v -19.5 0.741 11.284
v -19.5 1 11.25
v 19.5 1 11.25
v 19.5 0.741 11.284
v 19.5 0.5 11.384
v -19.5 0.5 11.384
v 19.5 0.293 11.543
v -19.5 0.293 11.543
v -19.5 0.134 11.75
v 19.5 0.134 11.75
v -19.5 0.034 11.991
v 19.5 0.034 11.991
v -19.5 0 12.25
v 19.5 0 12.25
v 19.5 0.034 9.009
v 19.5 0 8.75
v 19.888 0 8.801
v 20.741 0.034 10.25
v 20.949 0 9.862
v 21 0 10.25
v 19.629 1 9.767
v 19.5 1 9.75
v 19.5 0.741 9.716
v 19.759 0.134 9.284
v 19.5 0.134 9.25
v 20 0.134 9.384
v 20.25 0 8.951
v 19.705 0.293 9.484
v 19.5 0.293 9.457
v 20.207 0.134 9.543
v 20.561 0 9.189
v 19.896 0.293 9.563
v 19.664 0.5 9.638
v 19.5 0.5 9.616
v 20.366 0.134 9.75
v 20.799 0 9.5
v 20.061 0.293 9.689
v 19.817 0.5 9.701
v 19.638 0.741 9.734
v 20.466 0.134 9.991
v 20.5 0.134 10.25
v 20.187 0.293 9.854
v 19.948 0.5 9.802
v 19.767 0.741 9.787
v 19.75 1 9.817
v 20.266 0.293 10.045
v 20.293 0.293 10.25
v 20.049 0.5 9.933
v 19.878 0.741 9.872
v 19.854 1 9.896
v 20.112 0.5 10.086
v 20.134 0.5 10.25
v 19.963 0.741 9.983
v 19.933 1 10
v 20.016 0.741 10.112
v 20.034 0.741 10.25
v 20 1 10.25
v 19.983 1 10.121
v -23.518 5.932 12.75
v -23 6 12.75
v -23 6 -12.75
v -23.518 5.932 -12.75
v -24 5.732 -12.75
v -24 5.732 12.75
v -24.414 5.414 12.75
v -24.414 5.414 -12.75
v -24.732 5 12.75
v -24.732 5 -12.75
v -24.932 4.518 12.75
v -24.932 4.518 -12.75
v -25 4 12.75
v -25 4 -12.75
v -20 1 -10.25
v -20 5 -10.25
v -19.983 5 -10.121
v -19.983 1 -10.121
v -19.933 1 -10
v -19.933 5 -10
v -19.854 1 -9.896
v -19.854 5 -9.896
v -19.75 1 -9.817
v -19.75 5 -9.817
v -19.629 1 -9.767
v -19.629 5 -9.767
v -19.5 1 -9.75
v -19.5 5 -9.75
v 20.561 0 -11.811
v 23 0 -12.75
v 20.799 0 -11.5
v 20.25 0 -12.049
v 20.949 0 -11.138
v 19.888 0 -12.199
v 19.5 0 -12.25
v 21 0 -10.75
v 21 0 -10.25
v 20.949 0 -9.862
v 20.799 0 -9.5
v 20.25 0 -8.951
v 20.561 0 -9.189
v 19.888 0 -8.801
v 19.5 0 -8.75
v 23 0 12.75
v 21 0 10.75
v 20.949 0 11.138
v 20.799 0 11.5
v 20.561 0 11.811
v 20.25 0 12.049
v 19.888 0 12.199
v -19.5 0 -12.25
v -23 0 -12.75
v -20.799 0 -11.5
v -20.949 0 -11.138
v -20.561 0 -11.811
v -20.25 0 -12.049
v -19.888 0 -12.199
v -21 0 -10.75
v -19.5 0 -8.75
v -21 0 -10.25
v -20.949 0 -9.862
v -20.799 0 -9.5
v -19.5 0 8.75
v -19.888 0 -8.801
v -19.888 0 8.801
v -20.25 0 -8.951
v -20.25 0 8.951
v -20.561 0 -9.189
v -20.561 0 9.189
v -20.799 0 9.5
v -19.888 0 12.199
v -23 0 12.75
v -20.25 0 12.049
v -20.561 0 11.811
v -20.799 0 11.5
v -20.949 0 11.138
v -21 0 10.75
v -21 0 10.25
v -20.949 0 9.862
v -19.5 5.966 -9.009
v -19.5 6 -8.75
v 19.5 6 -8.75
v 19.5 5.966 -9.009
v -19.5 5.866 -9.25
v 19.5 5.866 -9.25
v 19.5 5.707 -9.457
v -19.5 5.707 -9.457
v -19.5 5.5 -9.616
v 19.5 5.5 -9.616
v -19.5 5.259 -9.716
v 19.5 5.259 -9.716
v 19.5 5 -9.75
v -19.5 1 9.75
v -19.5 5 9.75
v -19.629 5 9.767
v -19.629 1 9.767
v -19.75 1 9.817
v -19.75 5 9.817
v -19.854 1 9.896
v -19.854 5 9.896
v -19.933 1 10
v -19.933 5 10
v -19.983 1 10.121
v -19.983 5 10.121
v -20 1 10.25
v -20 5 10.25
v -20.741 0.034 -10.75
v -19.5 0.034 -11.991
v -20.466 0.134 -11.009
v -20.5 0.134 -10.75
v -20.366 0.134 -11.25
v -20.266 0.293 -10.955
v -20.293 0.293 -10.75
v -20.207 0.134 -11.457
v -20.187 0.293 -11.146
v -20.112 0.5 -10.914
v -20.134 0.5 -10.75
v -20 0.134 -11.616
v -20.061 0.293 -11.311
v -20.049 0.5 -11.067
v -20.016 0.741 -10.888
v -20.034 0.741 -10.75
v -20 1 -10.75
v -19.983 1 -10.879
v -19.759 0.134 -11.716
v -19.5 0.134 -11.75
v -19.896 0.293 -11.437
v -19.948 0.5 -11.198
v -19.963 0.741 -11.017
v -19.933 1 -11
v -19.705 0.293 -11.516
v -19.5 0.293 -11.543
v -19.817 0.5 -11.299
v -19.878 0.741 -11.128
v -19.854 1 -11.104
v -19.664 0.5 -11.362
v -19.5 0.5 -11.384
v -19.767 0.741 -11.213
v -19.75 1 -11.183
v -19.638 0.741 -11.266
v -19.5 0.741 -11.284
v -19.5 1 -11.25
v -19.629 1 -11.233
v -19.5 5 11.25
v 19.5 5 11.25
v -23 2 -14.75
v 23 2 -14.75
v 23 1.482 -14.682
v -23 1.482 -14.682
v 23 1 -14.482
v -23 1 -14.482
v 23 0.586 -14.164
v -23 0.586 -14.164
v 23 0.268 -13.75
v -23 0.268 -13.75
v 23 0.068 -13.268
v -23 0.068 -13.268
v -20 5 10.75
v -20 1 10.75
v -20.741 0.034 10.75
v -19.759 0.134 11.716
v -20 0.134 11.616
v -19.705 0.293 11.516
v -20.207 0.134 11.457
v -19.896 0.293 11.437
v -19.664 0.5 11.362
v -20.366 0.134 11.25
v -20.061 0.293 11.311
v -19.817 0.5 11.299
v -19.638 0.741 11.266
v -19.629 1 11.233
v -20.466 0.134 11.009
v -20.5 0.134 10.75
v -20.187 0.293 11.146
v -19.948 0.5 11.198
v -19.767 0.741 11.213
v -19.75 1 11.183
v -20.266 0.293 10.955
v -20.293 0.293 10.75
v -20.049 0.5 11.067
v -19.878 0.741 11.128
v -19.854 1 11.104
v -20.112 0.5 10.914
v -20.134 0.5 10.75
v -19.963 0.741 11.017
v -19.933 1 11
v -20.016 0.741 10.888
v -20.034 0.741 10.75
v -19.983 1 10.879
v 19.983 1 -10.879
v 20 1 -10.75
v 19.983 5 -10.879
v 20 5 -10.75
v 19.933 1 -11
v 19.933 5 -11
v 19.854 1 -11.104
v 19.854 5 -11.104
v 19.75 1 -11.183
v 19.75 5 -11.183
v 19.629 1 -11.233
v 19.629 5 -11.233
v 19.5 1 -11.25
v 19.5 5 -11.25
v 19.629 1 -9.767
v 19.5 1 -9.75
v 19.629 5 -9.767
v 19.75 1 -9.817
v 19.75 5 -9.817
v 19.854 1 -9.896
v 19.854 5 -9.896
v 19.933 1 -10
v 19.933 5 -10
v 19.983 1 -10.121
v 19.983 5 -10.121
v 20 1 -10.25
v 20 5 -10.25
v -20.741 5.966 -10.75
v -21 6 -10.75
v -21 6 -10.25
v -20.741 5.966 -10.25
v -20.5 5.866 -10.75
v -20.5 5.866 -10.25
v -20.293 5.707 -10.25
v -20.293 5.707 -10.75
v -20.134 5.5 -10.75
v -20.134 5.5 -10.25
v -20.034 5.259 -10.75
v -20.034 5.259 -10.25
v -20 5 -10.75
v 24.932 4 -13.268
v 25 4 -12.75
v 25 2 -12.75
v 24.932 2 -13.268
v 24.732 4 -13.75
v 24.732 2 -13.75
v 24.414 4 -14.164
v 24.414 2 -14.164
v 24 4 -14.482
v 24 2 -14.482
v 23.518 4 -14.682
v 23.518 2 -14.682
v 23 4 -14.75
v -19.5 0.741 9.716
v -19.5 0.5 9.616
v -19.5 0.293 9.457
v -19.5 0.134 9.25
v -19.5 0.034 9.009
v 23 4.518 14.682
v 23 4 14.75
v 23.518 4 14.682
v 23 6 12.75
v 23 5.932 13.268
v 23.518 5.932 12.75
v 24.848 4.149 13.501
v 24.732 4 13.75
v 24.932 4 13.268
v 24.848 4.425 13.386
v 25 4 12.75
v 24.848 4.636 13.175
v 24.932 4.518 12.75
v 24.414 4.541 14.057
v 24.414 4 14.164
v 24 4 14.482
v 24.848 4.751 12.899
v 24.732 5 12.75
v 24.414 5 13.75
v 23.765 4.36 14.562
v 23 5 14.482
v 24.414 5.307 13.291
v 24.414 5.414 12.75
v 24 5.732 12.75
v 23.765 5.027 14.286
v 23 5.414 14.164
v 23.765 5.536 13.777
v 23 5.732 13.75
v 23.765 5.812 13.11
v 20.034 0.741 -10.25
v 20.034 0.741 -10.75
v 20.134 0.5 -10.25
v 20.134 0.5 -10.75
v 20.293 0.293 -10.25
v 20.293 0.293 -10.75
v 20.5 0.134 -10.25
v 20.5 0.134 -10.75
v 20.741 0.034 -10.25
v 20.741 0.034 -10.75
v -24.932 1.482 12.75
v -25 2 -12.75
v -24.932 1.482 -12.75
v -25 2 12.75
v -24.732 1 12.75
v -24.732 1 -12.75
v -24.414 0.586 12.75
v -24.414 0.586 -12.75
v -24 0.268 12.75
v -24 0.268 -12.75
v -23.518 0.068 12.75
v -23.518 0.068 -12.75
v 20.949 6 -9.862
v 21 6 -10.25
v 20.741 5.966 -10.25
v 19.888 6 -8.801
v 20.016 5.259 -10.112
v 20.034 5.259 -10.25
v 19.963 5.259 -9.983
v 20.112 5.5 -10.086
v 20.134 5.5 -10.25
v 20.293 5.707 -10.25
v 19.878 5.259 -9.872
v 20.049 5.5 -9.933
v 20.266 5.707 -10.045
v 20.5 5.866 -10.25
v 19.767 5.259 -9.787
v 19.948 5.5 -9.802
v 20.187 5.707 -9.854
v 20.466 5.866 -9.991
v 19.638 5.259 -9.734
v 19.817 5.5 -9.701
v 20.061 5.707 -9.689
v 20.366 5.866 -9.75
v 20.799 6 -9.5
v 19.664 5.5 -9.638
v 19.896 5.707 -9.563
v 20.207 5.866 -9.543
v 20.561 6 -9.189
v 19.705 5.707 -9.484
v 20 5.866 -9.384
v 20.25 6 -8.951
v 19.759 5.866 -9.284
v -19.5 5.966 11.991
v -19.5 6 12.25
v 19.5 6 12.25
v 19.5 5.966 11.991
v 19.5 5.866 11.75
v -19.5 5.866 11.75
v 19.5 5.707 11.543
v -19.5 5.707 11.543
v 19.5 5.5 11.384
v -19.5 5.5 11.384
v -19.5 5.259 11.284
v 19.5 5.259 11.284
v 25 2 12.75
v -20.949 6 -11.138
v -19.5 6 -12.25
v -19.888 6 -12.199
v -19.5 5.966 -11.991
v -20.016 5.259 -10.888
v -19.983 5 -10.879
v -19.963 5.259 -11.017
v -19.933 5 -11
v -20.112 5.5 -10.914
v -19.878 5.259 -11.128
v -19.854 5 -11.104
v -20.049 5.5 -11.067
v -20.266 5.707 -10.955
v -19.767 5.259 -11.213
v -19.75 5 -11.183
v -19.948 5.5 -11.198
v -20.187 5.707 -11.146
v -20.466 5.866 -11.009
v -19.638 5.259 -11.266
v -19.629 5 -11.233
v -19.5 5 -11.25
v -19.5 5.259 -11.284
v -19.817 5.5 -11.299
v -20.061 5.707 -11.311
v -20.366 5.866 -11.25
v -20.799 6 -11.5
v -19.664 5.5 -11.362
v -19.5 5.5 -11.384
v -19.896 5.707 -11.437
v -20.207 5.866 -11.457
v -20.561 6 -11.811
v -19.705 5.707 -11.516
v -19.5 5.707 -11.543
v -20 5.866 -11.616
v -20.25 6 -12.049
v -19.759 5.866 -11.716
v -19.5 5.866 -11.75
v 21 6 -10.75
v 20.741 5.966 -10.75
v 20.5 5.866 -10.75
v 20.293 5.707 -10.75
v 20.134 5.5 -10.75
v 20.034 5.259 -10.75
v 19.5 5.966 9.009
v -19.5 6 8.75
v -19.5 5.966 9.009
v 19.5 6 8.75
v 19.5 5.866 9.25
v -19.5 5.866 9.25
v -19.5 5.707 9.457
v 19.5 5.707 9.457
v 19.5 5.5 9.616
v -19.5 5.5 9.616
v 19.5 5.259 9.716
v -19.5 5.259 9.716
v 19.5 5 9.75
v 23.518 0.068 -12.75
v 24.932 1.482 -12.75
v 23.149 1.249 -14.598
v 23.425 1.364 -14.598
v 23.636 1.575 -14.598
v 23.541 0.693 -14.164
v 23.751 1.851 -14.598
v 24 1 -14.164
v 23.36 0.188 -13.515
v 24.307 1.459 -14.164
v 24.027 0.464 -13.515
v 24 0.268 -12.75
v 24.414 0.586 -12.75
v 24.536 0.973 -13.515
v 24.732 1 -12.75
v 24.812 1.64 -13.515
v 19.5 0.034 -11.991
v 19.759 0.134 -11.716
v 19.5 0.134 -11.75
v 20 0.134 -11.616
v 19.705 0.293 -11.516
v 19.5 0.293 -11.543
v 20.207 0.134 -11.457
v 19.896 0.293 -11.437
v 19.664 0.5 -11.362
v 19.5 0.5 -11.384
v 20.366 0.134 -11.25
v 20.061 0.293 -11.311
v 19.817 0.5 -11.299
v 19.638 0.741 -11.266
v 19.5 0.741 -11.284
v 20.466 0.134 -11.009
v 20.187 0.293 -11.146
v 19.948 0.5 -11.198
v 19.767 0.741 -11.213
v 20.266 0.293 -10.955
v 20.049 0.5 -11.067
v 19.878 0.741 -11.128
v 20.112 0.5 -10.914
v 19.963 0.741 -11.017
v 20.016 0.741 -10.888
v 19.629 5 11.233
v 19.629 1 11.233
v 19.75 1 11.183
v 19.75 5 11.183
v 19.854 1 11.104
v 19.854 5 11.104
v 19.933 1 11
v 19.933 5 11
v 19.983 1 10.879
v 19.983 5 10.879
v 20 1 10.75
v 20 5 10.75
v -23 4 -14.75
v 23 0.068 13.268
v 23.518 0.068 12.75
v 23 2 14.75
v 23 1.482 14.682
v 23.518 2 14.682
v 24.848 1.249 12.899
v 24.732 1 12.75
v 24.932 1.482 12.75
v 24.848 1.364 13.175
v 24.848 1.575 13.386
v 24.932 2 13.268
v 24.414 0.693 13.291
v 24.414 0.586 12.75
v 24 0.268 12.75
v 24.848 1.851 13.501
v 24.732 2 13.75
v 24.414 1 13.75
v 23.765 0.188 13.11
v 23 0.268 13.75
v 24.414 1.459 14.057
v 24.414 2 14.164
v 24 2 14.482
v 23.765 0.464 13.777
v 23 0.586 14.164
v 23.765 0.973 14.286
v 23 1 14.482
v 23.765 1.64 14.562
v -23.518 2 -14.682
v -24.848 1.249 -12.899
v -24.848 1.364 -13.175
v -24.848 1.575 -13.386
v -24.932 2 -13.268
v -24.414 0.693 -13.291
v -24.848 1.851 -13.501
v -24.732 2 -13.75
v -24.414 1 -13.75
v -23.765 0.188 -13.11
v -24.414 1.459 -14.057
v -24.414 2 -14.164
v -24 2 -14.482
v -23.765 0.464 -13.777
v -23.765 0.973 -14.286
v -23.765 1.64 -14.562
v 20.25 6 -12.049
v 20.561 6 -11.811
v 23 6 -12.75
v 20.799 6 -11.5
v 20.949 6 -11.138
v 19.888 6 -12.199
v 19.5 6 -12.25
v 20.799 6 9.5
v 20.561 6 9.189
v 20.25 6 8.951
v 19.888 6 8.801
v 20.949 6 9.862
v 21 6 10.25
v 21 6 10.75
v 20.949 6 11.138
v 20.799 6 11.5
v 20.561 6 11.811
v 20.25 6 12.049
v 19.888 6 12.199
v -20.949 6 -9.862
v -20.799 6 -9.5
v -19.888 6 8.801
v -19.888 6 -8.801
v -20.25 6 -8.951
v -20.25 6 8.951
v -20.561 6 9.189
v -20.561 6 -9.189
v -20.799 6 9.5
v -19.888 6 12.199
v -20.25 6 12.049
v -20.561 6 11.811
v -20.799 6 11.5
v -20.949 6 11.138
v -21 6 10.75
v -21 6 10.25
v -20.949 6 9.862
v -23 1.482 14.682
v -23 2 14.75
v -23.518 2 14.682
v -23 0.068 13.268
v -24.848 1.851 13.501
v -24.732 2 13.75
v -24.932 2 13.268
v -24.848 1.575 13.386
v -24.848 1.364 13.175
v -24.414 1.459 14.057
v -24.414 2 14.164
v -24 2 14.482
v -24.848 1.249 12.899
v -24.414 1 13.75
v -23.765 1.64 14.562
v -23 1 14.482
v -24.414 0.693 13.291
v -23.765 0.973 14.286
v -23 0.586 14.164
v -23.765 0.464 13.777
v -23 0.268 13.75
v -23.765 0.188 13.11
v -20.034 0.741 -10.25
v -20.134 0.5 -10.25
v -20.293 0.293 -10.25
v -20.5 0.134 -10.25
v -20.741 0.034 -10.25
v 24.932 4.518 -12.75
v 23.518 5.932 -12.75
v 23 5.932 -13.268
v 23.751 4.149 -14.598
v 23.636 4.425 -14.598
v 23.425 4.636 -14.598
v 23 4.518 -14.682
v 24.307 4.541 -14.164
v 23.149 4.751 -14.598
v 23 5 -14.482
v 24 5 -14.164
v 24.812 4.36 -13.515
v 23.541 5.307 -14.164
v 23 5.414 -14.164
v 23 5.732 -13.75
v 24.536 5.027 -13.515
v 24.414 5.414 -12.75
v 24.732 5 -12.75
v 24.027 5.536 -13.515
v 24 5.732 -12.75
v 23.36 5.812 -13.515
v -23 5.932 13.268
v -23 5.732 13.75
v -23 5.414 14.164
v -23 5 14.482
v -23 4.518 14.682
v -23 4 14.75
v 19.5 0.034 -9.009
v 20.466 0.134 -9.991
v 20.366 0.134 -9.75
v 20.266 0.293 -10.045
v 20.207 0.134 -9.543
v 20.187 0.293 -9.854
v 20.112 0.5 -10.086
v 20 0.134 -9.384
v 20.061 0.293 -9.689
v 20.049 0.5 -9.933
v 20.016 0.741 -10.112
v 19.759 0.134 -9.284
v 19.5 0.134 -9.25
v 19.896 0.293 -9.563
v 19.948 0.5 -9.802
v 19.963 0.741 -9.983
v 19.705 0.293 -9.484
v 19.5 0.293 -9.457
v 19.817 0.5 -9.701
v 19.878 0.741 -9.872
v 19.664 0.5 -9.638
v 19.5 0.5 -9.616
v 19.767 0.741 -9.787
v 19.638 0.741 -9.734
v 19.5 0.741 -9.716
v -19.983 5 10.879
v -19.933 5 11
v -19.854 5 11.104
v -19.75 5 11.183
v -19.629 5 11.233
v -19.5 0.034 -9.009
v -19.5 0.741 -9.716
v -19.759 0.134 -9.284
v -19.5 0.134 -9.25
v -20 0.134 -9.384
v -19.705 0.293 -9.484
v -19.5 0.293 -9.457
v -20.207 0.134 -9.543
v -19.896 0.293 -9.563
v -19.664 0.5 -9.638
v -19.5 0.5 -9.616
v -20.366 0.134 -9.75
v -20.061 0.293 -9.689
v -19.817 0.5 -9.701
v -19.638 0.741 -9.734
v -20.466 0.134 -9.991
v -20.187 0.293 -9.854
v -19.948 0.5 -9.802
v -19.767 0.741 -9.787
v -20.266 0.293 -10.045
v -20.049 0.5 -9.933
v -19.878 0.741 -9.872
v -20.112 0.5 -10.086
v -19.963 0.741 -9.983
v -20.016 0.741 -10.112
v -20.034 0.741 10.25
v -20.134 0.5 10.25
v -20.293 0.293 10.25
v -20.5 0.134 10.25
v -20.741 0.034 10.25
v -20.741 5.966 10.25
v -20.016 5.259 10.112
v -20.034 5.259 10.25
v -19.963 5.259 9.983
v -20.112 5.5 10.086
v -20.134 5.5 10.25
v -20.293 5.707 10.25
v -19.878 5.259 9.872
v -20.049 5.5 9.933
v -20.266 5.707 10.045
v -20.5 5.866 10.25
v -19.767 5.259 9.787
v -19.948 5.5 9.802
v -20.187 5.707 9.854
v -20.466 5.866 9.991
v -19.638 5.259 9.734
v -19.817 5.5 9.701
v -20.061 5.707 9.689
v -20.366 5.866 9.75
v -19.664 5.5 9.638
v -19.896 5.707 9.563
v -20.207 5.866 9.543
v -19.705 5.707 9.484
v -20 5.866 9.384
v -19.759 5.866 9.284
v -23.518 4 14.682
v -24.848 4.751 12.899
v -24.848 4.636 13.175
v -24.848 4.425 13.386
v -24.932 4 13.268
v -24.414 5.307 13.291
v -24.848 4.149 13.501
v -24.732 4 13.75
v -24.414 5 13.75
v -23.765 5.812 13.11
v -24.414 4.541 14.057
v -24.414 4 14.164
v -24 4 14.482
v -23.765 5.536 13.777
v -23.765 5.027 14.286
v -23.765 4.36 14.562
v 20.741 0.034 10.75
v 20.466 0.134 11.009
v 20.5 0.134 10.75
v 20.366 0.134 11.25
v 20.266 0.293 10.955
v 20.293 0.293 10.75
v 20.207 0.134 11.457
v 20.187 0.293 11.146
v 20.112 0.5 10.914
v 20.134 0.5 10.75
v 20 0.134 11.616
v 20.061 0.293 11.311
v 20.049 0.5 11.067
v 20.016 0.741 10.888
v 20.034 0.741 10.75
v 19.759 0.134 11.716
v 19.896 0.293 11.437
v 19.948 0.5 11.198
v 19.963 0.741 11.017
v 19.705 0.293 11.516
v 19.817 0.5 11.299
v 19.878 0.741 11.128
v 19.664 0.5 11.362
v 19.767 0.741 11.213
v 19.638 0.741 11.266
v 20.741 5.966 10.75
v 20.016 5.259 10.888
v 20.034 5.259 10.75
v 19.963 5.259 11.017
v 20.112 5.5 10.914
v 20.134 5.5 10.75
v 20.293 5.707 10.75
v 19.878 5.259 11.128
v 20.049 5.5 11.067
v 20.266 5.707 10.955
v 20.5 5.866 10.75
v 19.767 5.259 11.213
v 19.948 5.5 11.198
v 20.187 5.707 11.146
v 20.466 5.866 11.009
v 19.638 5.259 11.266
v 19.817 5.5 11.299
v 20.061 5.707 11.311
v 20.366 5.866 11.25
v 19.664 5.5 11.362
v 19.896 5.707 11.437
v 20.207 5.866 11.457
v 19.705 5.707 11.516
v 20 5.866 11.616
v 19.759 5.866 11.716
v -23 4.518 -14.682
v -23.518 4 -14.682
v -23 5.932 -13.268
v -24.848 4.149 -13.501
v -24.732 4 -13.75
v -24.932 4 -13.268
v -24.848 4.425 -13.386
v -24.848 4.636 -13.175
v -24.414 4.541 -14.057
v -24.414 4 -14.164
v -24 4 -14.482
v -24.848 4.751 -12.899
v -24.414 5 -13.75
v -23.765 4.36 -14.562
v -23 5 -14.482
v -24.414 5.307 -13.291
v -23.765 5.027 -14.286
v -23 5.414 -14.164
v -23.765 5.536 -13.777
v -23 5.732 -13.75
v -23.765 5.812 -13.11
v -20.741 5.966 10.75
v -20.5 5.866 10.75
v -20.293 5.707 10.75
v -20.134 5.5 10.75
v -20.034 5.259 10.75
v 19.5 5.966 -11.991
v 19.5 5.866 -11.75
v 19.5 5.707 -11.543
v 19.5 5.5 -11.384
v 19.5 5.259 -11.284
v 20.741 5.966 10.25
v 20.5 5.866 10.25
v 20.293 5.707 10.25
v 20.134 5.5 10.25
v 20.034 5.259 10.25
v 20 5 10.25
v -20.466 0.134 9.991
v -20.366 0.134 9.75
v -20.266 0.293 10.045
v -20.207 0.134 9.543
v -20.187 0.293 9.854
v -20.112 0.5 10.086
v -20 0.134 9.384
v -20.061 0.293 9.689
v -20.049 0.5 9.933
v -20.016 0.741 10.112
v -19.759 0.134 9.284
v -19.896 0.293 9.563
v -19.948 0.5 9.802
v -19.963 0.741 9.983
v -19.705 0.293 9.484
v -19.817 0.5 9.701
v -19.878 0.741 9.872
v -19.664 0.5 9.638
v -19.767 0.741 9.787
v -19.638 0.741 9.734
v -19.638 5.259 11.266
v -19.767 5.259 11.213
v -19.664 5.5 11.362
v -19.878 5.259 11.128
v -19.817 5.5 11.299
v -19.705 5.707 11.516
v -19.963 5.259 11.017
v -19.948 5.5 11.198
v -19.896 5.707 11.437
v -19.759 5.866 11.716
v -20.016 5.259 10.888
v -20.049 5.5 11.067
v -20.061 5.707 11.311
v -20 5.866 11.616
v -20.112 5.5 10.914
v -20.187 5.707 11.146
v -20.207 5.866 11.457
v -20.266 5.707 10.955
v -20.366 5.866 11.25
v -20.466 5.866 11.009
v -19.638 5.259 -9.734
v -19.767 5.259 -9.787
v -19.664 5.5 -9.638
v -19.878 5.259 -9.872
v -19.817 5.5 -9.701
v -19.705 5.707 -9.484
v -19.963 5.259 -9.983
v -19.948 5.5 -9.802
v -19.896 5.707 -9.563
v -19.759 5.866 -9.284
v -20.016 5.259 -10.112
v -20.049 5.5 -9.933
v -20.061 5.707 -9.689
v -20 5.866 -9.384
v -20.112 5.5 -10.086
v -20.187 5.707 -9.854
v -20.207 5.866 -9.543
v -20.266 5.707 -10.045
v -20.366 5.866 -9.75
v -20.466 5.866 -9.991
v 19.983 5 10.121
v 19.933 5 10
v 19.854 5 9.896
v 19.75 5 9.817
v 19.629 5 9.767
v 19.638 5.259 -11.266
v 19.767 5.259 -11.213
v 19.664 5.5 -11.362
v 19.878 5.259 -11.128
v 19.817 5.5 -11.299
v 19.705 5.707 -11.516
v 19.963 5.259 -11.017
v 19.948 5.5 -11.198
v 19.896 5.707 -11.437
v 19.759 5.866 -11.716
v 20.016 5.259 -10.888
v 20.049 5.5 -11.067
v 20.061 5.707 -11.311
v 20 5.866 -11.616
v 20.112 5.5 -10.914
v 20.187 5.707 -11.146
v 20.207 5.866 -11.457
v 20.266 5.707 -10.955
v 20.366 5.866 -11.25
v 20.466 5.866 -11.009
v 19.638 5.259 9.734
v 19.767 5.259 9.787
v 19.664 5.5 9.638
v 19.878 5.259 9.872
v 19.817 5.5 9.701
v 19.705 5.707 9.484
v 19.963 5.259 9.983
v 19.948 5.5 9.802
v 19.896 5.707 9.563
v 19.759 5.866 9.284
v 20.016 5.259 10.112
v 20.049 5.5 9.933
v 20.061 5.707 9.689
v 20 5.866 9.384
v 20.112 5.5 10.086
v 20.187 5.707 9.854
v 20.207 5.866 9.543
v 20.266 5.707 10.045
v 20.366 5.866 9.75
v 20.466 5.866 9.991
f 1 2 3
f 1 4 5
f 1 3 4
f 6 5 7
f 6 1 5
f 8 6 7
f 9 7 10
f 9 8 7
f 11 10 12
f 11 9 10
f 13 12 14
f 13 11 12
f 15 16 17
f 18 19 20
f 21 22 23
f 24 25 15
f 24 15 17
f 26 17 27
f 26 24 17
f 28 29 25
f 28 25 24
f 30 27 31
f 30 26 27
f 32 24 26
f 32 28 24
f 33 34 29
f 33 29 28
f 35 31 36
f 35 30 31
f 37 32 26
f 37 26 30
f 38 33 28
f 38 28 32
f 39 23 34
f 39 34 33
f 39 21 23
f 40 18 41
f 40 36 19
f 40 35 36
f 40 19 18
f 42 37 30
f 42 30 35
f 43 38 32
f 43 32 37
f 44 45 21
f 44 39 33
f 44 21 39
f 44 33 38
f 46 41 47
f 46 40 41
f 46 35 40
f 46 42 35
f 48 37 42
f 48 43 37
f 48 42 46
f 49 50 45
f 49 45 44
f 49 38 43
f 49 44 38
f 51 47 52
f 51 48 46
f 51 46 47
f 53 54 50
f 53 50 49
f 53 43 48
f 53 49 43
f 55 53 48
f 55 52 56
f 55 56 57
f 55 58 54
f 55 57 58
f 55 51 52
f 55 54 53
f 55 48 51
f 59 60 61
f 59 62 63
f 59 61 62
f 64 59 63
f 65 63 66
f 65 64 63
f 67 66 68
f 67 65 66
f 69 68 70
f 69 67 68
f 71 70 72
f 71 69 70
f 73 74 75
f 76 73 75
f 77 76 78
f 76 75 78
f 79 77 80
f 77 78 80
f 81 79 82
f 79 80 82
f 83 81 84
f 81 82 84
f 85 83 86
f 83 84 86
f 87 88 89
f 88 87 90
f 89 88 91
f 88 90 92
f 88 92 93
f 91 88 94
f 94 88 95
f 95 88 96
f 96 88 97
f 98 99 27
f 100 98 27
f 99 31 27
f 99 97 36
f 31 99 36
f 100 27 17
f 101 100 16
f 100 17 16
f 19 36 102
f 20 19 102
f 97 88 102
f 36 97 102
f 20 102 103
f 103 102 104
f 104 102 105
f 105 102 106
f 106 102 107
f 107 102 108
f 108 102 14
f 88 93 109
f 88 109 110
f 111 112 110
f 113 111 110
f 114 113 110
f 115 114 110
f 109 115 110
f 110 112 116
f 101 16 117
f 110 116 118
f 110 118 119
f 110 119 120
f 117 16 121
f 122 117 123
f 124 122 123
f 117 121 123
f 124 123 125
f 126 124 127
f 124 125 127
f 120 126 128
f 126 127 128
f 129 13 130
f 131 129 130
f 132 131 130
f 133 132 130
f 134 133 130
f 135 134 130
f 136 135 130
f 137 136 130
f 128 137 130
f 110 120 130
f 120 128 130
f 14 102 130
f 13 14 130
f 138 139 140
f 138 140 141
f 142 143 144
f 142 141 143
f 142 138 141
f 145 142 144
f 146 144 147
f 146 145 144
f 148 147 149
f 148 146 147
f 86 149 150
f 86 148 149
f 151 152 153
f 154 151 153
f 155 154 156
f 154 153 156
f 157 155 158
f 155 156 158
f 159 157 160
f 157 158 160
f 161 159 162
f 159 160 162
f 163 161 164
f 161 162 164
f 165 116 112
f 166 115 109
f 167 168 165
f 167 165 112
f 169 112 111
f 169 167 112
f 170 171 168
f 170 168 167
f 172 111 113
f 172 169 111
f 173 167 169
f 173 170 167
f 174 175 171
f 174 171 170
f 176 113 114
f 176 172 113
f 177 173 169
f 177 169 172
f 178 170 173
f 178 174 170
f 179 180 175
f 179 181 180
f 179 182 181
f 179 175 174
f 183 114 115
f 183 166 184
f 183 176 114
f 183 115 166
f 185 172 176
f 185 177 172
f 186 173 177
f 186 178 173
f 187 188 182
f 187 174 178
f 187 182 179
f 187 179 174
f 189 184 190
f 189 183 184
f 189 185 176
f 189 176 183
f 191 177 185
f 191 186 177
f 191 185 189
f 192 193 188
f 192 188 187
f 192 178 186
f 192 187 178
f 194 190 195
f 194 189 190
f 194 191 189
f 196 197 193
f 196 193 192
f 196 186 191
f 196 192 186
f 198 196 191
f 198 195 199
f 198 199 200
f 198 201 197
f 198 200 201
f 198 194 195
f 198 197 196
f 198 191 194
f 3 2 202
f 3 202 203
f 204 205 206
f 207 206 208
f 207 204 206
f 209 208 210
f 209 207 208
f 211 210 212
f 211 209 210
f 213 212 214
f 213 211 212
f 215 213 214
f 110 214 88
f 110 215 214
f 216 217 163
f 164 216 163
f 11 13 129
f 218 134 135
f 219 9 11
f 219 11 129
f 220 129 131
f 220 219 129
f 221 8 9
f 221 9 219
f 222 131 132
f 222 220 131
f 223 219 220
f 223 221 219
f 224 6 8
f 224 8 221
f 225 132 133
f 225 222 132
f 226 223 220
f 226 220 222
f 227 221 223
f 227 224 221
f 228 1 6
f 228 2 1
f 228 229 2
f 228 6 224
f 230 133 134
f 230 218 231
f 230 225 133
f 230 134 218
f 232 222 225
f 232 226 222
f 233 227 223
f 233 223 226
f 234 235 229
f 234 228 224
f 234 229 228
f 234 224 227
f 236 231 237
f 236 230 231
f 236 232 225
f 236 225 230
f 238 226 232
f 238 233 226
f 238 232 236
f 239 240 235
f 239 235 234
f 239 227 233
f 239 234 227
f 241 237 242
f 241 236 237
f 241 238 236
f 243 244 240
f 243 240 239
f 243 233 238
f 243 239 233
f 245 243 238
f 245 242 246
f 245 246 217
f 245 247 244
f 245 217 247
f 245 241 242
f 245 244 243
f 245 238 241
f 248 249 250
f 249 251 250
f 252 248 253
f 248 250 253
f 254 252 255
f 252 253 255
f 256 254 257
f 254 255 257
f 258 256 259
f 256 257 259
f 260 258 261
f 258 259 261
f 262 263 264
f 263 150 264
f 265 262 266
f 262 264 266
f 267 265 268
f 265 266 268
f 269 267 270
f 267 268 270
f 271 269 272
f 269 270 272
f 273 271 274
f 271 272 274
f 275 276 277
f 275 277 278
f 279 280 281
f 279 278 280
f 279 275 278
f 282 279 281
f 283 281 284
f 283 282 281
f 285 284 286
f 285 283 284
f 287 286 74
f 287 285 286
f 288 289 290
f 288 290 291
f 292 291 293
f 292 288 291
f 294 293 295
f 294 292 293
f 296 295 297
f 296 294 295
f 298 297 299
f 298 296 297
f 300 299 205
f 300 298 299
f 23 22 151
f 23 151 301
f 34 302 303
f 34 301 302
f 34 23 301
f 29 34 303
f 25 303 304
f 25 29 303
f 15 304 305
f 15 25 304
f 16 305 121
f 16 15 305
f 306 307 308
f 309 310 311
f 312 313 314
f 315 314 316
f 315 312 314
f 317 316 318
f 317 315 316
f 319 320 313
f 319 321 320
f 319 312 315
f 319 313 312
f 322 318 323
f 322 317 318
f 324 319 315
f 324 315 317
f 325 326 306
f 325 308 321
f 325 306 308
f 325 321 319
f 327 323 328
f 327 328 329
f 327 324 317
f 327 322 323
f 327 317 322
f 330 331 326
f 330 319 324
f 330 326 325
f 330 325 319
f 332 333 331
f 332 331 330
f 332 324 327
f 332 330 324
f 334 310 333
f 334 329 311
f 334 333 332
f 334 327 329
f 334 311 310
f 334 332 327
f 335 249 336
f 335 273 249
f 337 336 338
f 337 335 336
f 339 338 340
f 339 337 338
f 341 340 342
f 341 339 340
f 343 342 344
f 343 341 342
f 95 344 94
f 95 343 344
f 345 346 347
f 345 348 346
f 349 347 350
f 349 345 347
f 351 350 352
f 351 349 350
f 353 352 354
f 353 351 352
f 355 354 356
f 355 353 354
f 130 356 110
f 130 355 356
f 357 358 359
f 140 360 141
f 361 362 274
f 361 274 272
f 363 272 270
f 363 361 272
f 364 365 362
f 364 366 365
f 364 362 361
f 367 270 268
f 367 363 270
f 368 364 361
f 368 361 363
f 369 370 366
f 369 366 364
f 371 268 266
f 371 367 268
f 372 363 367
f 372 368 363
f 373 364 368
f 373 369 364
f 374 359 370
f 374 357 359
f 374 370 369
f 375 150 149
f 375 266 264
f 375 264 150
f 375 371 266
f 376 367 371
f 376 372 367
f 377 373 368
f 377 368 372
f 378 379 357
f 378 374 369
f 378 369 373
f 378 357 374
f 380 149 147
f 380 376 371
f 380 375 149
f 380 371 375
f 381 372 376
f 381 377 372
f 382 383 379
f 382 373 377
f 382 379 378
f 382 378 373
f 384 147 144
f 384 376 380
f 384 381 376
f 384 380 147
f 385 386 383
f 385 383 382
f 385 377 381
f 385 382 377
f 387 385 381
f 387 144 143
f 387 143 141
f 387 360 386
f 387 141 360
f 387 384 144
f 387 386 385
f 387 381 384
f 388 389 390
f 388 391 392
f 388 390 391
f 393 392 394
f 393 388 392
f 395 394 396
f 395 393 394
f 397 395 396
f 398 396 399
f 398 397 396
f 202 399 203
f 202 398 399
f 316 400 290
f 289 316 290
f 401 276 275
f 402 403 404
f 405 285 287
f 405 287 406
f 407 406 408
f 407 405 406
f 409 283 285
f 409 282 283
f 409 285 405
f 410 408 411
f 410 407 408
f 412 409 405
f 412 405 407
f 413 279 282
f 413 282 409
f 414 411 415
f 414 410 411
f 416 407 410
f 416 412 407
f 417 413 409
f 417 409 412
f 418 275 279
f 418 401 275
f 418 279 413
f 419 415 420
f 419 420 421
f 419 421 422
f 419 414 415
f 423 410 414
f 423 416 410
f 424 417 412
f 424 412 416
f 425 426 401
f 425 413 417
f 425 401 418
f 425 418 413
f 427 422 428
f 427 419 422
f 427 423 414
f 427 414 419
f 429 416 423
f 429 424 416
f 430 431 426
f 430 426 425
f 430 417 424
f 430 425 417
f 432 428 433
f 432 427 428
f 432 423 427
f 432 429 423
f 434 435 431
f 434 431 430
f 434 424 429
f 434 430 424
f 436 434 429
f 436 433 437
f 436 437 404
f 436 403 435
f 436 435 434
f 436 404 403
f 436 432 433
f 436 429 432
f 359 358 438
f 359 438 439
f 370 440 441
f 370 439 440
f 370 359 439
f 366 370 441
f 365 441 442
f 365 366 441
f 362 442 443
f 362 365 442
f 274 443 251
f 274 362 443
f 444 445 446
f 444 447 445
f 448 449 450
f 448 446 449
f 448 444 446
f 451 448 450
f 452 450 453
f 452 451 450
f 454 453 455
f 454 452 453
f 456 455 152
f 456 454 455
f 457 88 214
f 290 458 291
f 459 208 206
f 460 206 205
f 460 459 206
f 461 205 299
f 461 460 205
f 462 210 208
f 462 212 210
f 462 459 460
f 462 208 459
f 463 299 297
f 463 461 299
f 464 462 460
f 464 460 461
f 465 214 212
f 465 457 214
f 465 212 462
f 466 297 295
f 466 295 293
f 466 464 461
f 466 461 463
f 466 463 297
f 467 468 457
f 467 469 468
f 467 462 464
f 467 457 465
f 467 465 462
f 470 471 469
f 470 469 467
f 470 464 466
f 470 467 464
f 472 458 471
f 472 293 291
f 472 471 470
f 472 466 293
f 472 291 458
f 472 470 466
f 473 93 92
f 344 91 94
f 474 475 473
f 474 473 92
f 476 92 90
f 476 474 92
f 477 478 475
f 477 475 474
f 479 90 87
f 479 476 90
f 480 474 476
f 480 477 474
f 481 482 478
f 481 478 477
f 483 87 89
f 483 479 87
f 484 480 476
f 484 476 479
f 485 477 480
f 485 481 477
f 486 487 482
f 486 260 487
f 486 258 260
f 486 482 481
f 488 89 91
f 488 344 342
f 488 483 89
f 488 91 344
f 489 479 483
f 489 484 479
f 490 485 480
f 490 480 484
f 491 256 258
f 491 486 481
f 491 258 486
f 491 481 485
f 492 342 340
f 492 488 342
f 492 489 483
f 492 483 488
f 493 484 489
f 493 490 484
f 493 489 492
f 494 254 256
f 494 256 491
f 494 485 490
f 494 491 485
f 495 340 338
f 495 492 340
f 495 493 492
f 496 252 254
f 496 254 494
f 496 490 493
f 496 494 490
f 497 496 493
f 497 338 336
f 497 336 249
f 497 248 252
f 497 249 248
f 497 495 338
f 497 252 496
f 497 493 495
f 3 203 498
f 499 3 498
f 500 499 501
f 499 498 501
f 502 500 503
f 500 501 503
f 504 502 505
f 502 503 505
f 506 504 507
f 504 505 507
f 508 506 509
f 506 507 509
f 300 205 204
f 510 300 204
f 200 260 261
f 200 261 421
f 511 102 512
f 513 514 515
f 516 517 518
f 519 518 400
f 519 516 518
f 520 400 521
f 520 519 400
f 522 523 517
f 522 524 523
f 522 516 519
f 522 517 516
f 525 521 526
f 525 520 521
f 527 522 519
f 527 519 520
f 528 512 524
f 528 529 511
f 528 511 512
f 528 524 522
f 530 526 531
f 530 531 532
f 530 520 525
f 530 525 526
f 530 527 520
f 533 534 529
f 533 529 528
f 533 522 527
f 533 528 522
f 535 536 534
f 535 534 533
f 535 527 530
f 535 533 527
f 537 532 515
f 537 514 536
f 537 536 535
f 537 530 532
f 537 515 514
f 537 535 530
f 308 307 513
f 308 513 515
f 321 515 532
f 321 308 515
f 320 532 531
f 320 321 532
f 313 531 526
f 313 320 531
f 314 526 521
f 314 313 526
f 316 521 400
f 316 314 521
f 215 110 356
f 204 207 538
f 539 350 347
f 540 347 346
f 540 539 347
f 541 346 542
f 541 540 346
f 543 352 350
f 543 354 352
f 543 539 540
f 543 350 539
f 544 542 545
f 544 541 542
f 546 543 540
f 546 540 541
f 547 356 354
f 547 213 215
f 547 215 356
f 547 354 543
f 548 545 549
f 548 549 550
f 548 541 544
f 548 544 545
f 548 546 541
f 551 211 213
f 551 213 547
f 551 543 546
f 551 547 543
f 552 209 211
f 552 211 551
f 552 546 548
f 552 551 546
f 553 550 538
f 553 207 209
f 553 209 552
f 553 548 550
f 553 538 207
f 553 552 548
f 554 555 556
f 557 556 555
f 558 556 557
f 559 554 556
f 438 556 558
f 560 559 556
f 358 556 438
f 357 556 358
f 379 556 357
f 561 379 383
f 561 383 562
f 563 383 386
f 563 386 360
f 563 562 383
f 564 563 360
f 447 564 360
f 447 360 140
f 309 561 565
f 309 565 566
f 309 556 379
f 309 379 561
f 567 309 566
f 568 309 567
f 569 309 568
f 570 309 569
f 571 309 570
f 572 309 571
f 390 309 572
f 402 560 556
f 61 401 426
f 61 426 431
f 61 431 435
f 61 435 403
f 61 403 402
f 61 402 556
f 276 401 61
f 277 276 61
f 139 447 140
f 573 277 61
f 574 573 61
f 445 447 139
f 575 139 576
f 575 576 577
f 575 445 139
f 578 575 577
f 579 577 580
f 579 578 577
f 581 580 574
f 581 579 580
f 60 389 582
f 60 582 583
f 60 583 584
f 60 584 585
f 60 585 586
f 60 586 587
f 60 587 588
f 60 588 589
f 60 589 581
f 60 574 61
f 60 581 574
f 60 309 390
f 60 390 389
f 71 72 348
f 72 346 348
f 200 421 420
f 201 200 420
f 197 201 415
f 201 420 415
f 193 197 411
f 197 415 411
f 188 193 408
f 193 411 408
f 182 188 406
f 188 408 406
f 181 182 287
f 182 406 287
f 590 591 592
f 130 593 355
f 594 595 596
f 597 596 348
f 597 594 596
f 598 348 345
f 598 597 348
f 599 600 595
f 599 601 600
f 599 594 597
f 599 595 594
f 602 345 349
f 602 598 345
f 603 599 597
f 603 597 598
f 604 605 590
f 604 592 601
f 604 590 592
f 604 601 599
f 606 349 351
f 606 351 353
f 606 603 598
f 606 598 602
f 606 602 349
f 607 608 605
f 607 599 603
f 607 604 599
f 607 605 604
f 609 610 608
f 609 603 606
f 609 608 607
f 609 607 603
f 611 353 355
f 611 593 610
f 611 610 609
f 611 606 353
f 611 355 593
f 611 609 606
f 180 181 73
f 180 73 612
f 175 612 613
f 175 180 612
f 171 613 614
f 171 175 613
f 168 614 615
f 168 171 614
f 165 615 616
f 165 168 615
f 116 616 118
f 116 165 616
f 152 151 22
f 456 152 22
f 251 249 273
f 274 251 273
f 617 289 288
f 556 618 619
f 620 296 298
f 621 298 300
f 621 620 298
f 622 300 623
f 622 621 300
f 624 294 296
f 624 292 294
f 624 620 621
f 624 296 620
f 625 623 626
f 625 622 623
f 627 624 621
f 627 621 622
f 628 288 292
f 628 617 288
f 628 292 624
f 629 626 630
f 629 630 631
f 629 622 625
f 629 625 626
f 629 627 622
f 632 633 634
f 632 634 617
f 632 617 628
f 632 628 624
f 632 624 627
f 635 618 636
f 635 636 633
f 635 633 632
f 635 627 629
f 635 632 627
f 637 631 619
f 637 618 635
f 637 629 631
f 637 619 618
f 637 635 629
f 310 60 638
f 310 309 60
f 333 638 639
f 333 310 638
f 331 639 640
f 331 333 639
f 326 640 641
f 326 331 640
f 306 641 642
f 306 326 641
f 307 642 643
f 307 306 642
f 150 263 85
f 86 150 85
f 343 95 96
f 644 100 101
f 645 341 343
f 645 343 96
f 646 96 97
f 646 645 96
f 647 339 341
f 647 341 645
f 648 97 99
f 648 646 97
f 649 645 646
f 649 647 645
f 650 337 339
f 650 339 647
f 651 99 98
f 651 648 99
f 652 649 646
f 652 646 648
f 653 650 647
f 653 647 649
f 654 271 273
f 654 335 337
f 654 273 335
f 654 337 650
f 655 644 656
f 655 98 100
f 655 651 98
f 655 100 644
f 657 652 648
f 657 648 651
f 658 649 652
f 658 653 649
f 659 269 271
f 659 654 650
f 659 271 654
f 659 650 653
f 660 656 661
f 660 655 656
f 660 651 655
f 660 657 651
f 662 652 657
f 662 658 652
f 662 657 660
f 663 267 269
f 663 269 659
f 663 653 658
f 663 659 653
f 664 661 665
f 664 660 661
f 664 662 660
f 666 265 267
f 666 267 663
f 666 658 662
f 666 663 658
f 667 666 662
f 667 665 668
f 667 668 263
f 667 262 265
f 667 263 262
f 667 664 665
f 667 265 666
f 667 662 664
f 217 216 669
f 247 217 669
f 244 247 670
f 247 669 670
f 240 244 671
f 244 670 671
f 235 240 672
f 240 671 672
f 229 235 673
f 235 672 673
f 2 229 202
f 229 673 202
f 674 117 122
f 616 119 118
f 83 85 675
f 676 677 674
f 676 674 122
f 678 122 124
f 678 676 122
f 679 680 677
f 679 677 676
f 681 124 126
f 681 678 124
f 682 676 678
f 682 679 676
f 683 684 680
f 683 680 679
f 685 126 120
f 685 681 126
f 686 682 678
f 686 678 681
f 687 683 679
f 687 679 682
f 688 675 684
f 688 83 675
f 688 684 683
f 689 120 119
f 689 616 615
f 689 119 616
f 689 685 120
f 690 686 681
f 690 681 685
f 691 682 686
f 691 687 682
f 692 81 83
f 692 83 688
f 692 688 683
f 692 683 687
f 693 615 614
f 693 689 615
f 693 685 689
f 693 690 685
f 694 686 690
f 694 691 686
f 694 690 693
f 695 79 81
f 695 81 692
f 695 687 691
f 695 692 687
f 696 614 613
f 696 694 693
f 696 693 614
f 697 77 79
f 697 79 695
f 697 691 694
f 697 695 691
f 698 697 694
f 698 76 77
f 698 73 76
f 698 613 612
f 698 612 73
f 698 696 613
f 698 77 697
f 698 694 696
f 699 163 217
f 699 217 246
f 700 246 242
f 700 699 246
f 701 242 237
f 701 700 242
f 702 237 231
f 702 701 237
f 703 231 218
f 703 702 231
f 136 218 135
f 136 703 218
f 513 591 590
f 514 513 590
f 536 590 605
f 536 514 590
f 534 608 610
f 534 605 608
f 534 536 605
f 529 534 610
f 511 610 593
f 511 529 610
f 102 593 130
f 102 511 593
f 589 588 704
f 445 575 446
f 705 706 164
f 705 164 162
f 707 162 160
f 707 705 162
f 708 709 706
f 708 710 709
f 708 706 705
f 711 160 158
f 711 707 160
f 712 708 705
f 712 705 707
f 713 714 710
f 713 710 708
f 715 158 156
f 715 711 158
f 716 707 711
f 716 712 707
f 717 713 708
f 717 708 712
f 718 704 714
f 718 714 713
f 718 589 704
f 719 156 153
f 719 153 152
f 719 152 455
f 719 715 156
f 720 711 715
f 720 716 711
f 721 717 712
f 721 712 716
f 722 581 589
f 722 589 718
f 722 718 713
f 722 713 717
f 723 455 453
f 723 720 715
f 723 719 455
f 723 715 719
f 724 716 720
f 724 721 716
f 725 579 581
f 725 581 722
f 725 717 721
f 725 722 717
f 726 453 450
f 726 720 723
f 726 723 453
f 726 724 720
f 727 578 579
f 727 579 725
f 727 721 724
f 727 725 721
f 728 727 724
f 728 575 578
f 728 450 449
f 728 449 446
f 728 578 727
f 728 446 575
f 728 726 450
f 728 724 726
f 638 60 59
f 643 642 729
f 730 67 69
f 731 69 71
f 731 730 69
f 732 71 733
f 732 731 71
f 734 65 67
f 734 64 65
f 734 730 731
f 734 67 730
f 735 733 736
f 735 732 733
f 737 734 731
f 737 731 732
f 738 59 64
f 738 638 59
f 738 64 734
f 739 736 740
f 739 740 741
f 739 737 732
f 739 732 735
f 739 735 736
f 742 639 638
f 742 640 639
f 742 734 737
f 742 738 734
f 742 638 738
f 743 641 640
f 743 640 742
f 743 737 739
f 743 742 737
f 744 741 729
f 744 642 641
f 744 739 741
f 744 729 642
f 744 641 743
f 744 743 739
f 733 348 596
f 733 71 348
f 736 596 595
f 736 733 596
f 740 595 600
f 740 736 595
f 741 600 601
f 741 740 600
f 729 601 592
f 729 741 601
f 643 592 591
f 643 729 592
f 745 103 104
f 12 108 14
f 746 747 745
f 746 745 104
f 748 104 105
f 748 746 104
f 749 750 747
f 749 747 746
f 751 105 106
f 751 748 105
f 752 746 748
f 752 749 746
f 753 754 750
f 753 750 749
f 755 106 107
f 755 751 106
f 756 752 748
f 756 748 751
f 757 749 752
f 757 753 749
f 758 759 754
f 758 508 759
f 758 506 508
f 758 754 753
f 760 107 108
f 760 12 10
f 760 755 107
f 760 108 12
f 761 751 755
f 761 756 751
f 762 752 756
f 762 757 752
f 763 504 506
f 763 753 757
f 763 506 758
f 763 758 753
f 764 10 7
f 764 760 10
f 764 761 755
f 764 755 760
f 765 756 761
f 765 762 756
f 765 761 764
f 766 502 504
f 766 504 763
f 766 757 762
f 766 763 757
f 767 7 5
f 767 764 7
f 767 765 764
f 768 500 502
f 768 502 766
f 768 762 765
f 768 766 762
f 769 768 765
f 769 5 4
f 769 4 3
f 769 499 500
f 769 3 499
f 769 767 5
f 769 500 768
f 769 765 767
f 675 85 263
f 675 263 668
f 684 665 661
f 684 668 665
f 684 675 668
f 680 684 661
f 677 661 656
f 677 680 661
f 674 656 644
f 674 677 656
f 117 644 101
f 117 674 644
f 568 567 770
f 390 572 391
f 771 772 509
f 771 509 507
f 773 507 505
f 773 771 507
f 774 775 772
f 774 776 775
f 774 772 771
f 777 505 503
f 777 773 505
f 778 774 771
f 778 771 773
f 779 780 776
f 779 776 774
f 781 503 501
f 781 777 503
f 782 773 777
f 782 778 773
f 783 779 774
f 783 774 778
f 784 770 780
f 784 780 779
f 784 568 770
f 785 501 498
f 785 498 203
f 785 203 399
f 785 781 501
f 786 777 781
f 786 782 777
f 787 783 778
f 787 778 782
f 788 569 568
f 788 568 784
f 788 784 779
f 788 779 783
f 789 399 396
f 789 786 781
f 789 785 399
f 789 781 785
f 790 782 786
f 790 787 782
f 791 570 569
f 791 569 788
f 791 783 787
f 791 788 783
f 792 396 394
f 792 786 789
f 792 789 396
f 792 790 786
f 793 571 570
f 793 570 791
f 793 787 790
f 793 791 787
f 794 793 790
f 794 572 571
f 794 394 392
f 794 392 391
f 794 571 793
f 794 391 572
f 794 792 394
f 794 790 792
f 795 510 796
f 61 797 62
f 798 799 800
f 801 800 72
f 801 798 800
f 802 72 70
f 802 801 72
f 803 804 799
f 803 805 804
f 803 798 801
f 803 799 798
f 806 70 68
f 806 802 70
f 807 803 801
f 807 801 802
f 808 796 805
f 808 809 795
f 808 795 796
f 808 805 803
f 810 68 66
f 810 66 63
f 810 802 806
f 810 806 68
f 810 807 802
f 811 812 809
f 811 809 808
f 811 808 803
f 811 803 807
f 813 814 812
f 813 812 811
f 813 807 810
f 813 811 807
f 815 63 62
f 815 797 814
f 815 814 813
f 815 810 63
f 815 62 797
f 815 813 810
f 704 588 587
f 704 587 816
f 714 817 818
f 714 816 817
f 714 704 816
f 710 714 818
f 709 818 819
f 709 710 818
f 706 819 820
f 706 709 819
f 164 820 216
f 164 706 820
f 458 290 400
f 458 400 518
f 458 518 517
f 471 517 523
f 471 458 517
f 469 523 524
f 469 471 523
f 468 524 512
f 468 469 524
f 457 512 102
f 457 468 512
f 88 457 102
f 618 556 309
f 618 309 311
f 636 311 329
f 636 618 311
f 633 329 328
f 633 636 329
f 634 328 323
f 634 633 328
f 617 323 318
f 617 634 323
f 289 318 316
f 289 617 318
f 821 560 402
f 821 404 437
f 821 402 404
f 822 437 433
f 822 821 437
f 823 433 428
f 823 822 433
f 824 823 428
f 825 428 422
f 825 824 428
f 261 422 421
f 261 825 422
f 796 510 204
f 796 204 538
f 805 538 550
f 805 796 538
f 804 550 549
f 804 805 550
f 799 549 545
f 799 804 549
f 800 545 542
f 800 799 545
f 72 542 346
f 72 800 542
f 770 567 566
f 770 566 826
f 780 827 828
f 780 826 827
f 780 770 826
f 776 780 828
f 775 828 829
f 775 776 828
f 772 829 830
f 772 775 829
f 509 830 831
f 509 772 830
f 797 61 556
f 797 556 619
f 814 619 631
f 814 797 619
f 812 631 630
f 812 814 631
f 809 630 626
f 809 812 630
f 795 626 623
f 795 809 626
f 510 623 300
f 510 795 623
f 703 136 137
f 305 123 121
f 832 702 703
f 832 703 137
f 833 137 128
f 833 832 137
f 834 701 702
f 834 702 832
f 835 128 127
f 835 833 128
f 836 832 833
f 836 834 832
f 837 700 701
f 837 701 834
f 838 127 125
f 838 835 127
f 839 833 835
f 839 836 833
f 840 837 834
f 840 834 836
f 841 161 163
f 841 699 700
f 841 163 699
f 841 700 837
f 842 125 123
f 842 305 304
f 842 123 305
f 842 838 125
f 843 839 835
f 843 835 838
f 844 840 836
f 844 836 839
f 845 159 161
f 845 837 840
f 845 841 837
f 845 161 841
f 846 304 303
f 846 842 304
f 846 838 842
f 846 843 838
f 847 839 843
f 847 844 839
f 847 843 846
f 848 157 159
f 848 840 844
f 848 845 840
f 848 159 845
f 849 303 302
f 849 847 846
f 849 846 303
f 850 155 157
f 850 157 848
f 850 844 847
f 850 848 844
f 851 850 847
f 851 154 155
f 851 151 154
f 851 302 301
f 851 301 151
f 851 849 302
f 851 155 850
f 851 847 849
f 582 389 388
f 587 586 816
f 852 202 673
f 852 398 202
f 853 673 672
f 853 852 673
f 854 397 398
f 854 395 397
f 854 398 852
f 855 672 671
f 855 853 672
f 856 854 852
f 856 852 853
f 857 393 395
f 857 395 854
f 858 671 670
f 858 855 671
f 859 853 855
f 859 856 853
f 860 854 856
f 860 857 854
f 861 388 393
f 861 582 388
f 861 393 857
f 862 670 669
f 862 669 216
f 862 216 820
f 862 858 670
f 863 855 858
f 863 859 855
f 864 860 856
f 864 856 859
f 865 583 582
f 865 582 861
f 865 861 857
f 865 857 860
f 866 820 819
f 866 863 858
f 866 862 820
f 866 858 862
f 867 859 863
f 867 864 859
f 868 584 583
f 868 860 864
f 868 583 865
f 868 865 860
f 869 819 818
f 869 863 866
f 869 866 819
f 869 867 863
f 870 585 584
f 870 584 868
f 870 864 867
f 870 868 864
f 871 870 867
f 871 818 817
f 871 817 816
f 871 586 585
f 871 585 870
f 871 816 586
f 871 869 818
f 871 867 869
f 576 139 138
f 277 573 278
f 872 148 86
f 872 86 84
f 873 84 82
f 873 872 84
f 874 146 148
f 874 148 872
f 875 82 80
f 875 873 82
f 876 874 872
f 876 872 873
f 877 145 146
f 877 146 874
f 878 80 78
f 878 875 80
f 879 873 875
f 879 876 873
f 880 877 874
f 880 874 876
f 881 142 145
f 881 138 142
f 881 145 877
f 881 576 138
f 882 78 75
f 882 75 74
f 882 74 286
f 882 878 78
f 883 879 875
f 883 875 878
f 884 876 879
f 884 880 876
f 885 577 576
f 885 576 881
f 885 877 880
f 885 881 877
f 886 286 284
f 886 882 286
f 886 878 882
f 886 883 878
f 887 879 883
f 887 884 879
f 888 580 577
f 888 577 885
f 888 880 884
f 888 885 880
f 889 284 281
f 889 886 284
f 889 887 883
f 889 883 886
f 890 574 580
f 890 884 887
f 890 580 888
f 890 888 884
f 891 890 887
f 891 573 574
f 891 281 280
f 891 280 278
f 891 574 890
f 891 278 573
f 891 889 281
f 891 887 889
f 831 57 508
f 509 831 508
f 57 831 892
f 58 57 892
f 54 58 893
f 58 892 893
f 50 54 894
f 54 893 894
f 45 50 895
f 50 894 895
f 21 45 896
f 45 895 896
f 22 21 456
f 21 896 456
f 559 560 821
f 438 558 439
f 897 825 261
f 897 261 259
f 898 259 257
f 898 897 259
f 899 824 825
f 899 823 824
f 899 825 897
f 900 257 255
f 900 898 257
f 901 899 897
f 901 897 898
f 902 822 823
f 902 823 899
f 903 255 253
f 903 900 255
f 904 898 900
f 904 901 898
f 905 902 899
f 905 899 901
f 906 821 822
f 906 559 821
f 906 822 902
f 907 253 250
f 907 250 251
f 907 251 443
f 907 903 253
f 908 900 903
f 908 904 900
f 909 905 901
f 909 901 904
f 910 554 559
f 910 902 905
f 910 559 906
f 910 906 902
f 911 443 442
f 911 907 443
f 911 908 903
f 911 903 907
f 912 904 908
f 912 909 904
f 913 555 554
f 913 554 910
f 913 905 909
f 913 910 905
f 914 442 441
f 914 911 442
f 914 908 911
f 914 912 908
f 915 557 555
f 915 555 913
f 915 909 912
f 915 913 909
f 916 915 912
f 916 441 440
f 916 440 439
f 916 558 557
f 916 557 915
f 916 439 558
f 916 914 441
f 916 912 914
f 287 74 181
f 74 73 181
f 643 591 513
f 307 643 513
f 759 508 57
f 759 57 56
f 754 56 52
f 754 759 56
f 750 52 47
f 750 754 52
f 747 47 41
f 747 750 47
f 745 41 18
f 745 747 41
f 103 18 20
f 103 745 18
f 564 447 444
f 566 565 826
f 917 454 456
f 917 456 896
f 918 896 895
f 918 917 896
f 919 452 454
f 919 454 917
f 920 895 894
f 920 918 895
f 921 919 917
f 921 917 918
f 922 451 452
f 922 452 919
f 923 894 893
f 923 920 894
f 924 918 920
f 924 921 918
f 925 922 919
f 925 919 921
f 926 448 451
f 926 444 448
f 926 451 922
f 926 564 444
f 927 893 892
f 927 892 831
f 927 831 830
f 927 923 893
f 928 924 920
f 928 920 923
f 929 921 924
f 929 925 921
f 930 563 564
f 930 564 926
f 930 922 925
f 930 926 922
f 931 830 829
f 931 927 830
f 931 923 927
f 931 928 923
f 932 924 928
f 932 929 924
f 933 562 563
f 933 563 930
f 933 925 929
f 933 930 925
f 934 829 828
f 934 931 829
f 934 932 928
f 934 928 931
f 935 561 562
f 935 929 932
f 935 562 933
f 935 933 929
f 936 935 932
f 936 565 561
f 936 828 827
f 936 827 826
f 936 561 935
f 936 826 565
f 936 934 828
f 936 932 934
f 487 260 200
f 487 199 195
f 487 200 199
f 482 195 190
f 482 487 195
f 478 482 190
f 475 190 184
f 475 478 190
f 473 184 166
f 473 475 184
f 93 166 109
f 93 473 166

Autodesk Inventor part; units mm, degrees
ref_plane "YZ Plane" through (0, 0, 0) normal (1, 0, 0) x (0, 1, 0)
ref_plane "XZ Plane" through (0, 0, 0) normal (0, 1, 0) x (-1, 0, 0)
ref_plane "XY Plane" through (0, 0, 0) normal (0, 0, 1) x (1, 0, 0)
sketch "Sketch1" plane through (0, 0, 0) normal (0, 1, 0) x (-1, 0, 0)
  line L0 (20, 9.75) -> (-20, 9.75)
  line L1 (-20, 9.75) -> (-20, -9.75)
  line L2 (-20, -9.75) -> (20, -9.75)
  line L3 (20, -9.75) -> (20, 9.75)
  line L4 (20, 9.75) -> (-20, -9.75) construction
  line L5 (-20, 9.75) -> (20, -9.75) construction
  line L6 (21.5, 11.25) -> (-21.5, 11.25)
  line L7 (-21.5, 11.25) -> (-21.5, -11.25)
  line L8 (-21.5, -11.25) -> (21.5, -11.25)
  line L9 (21.5, -11.25) -> (21.5, 11.25)
  line L10 (-20, 11.25) -> (20, 11.25)
  line L11 (20, 11.25) -> (20, -11.25)
  line L12 (20, -11.25) -> (-20, -11.25)
  line L13 (-20, -11.25) -> (-20, 11.25)
  line L14 (-20, 11.25) -> (20, -11.25) construction
  line L15 (20, 11.25) -> (-20, -11.25) construction
  line L16 (25, 14.75) -> (-25, 14.75)
  line L17 (-25, 14.75) -> (-25, -14.75)
  line L18 (-25, -14.75) -> (25, -14.75)
  line L19 (25, -14.75) -> (25, 14.75)
  point P0 (0, 0)
  point P1 (-19.6517, -9.75)
  dimension "d0" = 40
  dimension "d1" = 19.5
  dimension "d2" = 1.5
  dimension "d3" = 3.5
extrude "Extrusion1" add sketch "Sketch1" along normal blind 6 contours L3 L2 L1 L0 | L11 L6 L9 L8 L3 | L1 L13 L8 L7 L6 | L19 L18 L17 L16
fillet "Fillet1" radius 2 12 edges at (0, 6, 14.75) (0, 0, 14.75) (25, 0, 0) (25, 6, 0) (0, 6, -14.75) (0, 0, -14.75) (-25, 0, 0) (-25, 6, 0) (-25, 3, 14.75) (-25, 3, -14.75) (25, 3, -14.75) (25, 3, 14.75)
fillet "Fillet2" radius 0.5 8 edges at (-20, 3, 9.75) (-20, 3, 11.25) (-20, 3, -9.75) (-20, 3, -11.25) (20, 3, -11.25) (20, 3, 9.75) (20, 3, 11.25) (20, 3, -9.75)
fillet "Fillet3" radius 1 32 edges at (-19.8536, 6, -9.8964) (-20, 6, -10.5) (-19.8536, 6, -11.1036) (0, 6, -11.25) (19.8536, 6, -11.1036) (20, 6, -10.5) (19.8536, 6, -9.8964) (0, 6, -9.75) (19.8536, 6, 9.8964) (20, 6, 10.5) (19.8536, 6, 11.1036) (0, 6, 11.25) (-19.8536, 6, 11.1036) (-20, 6, 10.5) (-19.8536, 6, 9.8964) (0, 6, 9.75) (19.8536, 0, 9.8964) (20, 0, 10.5) (19.8536, 0, 11.1036) (0, 0, 11.25) (-19.8536, 0, 11.1036) (-20, 0, 10.5) (-19.8536, 0, 9.8964) (0, 0, 9.75) (-19.8536, 0, -9.8964) (-20, 0, -10.5) (-19.8536, 0, -11.1036) (0, 0, -11.25) (19.8536, 0, -11.1036) (20, 0, -10.5) (19.8536, 0, -9.8964) (0, 0, -9.75)
properties part number "Trimming Template_3DPrint"
